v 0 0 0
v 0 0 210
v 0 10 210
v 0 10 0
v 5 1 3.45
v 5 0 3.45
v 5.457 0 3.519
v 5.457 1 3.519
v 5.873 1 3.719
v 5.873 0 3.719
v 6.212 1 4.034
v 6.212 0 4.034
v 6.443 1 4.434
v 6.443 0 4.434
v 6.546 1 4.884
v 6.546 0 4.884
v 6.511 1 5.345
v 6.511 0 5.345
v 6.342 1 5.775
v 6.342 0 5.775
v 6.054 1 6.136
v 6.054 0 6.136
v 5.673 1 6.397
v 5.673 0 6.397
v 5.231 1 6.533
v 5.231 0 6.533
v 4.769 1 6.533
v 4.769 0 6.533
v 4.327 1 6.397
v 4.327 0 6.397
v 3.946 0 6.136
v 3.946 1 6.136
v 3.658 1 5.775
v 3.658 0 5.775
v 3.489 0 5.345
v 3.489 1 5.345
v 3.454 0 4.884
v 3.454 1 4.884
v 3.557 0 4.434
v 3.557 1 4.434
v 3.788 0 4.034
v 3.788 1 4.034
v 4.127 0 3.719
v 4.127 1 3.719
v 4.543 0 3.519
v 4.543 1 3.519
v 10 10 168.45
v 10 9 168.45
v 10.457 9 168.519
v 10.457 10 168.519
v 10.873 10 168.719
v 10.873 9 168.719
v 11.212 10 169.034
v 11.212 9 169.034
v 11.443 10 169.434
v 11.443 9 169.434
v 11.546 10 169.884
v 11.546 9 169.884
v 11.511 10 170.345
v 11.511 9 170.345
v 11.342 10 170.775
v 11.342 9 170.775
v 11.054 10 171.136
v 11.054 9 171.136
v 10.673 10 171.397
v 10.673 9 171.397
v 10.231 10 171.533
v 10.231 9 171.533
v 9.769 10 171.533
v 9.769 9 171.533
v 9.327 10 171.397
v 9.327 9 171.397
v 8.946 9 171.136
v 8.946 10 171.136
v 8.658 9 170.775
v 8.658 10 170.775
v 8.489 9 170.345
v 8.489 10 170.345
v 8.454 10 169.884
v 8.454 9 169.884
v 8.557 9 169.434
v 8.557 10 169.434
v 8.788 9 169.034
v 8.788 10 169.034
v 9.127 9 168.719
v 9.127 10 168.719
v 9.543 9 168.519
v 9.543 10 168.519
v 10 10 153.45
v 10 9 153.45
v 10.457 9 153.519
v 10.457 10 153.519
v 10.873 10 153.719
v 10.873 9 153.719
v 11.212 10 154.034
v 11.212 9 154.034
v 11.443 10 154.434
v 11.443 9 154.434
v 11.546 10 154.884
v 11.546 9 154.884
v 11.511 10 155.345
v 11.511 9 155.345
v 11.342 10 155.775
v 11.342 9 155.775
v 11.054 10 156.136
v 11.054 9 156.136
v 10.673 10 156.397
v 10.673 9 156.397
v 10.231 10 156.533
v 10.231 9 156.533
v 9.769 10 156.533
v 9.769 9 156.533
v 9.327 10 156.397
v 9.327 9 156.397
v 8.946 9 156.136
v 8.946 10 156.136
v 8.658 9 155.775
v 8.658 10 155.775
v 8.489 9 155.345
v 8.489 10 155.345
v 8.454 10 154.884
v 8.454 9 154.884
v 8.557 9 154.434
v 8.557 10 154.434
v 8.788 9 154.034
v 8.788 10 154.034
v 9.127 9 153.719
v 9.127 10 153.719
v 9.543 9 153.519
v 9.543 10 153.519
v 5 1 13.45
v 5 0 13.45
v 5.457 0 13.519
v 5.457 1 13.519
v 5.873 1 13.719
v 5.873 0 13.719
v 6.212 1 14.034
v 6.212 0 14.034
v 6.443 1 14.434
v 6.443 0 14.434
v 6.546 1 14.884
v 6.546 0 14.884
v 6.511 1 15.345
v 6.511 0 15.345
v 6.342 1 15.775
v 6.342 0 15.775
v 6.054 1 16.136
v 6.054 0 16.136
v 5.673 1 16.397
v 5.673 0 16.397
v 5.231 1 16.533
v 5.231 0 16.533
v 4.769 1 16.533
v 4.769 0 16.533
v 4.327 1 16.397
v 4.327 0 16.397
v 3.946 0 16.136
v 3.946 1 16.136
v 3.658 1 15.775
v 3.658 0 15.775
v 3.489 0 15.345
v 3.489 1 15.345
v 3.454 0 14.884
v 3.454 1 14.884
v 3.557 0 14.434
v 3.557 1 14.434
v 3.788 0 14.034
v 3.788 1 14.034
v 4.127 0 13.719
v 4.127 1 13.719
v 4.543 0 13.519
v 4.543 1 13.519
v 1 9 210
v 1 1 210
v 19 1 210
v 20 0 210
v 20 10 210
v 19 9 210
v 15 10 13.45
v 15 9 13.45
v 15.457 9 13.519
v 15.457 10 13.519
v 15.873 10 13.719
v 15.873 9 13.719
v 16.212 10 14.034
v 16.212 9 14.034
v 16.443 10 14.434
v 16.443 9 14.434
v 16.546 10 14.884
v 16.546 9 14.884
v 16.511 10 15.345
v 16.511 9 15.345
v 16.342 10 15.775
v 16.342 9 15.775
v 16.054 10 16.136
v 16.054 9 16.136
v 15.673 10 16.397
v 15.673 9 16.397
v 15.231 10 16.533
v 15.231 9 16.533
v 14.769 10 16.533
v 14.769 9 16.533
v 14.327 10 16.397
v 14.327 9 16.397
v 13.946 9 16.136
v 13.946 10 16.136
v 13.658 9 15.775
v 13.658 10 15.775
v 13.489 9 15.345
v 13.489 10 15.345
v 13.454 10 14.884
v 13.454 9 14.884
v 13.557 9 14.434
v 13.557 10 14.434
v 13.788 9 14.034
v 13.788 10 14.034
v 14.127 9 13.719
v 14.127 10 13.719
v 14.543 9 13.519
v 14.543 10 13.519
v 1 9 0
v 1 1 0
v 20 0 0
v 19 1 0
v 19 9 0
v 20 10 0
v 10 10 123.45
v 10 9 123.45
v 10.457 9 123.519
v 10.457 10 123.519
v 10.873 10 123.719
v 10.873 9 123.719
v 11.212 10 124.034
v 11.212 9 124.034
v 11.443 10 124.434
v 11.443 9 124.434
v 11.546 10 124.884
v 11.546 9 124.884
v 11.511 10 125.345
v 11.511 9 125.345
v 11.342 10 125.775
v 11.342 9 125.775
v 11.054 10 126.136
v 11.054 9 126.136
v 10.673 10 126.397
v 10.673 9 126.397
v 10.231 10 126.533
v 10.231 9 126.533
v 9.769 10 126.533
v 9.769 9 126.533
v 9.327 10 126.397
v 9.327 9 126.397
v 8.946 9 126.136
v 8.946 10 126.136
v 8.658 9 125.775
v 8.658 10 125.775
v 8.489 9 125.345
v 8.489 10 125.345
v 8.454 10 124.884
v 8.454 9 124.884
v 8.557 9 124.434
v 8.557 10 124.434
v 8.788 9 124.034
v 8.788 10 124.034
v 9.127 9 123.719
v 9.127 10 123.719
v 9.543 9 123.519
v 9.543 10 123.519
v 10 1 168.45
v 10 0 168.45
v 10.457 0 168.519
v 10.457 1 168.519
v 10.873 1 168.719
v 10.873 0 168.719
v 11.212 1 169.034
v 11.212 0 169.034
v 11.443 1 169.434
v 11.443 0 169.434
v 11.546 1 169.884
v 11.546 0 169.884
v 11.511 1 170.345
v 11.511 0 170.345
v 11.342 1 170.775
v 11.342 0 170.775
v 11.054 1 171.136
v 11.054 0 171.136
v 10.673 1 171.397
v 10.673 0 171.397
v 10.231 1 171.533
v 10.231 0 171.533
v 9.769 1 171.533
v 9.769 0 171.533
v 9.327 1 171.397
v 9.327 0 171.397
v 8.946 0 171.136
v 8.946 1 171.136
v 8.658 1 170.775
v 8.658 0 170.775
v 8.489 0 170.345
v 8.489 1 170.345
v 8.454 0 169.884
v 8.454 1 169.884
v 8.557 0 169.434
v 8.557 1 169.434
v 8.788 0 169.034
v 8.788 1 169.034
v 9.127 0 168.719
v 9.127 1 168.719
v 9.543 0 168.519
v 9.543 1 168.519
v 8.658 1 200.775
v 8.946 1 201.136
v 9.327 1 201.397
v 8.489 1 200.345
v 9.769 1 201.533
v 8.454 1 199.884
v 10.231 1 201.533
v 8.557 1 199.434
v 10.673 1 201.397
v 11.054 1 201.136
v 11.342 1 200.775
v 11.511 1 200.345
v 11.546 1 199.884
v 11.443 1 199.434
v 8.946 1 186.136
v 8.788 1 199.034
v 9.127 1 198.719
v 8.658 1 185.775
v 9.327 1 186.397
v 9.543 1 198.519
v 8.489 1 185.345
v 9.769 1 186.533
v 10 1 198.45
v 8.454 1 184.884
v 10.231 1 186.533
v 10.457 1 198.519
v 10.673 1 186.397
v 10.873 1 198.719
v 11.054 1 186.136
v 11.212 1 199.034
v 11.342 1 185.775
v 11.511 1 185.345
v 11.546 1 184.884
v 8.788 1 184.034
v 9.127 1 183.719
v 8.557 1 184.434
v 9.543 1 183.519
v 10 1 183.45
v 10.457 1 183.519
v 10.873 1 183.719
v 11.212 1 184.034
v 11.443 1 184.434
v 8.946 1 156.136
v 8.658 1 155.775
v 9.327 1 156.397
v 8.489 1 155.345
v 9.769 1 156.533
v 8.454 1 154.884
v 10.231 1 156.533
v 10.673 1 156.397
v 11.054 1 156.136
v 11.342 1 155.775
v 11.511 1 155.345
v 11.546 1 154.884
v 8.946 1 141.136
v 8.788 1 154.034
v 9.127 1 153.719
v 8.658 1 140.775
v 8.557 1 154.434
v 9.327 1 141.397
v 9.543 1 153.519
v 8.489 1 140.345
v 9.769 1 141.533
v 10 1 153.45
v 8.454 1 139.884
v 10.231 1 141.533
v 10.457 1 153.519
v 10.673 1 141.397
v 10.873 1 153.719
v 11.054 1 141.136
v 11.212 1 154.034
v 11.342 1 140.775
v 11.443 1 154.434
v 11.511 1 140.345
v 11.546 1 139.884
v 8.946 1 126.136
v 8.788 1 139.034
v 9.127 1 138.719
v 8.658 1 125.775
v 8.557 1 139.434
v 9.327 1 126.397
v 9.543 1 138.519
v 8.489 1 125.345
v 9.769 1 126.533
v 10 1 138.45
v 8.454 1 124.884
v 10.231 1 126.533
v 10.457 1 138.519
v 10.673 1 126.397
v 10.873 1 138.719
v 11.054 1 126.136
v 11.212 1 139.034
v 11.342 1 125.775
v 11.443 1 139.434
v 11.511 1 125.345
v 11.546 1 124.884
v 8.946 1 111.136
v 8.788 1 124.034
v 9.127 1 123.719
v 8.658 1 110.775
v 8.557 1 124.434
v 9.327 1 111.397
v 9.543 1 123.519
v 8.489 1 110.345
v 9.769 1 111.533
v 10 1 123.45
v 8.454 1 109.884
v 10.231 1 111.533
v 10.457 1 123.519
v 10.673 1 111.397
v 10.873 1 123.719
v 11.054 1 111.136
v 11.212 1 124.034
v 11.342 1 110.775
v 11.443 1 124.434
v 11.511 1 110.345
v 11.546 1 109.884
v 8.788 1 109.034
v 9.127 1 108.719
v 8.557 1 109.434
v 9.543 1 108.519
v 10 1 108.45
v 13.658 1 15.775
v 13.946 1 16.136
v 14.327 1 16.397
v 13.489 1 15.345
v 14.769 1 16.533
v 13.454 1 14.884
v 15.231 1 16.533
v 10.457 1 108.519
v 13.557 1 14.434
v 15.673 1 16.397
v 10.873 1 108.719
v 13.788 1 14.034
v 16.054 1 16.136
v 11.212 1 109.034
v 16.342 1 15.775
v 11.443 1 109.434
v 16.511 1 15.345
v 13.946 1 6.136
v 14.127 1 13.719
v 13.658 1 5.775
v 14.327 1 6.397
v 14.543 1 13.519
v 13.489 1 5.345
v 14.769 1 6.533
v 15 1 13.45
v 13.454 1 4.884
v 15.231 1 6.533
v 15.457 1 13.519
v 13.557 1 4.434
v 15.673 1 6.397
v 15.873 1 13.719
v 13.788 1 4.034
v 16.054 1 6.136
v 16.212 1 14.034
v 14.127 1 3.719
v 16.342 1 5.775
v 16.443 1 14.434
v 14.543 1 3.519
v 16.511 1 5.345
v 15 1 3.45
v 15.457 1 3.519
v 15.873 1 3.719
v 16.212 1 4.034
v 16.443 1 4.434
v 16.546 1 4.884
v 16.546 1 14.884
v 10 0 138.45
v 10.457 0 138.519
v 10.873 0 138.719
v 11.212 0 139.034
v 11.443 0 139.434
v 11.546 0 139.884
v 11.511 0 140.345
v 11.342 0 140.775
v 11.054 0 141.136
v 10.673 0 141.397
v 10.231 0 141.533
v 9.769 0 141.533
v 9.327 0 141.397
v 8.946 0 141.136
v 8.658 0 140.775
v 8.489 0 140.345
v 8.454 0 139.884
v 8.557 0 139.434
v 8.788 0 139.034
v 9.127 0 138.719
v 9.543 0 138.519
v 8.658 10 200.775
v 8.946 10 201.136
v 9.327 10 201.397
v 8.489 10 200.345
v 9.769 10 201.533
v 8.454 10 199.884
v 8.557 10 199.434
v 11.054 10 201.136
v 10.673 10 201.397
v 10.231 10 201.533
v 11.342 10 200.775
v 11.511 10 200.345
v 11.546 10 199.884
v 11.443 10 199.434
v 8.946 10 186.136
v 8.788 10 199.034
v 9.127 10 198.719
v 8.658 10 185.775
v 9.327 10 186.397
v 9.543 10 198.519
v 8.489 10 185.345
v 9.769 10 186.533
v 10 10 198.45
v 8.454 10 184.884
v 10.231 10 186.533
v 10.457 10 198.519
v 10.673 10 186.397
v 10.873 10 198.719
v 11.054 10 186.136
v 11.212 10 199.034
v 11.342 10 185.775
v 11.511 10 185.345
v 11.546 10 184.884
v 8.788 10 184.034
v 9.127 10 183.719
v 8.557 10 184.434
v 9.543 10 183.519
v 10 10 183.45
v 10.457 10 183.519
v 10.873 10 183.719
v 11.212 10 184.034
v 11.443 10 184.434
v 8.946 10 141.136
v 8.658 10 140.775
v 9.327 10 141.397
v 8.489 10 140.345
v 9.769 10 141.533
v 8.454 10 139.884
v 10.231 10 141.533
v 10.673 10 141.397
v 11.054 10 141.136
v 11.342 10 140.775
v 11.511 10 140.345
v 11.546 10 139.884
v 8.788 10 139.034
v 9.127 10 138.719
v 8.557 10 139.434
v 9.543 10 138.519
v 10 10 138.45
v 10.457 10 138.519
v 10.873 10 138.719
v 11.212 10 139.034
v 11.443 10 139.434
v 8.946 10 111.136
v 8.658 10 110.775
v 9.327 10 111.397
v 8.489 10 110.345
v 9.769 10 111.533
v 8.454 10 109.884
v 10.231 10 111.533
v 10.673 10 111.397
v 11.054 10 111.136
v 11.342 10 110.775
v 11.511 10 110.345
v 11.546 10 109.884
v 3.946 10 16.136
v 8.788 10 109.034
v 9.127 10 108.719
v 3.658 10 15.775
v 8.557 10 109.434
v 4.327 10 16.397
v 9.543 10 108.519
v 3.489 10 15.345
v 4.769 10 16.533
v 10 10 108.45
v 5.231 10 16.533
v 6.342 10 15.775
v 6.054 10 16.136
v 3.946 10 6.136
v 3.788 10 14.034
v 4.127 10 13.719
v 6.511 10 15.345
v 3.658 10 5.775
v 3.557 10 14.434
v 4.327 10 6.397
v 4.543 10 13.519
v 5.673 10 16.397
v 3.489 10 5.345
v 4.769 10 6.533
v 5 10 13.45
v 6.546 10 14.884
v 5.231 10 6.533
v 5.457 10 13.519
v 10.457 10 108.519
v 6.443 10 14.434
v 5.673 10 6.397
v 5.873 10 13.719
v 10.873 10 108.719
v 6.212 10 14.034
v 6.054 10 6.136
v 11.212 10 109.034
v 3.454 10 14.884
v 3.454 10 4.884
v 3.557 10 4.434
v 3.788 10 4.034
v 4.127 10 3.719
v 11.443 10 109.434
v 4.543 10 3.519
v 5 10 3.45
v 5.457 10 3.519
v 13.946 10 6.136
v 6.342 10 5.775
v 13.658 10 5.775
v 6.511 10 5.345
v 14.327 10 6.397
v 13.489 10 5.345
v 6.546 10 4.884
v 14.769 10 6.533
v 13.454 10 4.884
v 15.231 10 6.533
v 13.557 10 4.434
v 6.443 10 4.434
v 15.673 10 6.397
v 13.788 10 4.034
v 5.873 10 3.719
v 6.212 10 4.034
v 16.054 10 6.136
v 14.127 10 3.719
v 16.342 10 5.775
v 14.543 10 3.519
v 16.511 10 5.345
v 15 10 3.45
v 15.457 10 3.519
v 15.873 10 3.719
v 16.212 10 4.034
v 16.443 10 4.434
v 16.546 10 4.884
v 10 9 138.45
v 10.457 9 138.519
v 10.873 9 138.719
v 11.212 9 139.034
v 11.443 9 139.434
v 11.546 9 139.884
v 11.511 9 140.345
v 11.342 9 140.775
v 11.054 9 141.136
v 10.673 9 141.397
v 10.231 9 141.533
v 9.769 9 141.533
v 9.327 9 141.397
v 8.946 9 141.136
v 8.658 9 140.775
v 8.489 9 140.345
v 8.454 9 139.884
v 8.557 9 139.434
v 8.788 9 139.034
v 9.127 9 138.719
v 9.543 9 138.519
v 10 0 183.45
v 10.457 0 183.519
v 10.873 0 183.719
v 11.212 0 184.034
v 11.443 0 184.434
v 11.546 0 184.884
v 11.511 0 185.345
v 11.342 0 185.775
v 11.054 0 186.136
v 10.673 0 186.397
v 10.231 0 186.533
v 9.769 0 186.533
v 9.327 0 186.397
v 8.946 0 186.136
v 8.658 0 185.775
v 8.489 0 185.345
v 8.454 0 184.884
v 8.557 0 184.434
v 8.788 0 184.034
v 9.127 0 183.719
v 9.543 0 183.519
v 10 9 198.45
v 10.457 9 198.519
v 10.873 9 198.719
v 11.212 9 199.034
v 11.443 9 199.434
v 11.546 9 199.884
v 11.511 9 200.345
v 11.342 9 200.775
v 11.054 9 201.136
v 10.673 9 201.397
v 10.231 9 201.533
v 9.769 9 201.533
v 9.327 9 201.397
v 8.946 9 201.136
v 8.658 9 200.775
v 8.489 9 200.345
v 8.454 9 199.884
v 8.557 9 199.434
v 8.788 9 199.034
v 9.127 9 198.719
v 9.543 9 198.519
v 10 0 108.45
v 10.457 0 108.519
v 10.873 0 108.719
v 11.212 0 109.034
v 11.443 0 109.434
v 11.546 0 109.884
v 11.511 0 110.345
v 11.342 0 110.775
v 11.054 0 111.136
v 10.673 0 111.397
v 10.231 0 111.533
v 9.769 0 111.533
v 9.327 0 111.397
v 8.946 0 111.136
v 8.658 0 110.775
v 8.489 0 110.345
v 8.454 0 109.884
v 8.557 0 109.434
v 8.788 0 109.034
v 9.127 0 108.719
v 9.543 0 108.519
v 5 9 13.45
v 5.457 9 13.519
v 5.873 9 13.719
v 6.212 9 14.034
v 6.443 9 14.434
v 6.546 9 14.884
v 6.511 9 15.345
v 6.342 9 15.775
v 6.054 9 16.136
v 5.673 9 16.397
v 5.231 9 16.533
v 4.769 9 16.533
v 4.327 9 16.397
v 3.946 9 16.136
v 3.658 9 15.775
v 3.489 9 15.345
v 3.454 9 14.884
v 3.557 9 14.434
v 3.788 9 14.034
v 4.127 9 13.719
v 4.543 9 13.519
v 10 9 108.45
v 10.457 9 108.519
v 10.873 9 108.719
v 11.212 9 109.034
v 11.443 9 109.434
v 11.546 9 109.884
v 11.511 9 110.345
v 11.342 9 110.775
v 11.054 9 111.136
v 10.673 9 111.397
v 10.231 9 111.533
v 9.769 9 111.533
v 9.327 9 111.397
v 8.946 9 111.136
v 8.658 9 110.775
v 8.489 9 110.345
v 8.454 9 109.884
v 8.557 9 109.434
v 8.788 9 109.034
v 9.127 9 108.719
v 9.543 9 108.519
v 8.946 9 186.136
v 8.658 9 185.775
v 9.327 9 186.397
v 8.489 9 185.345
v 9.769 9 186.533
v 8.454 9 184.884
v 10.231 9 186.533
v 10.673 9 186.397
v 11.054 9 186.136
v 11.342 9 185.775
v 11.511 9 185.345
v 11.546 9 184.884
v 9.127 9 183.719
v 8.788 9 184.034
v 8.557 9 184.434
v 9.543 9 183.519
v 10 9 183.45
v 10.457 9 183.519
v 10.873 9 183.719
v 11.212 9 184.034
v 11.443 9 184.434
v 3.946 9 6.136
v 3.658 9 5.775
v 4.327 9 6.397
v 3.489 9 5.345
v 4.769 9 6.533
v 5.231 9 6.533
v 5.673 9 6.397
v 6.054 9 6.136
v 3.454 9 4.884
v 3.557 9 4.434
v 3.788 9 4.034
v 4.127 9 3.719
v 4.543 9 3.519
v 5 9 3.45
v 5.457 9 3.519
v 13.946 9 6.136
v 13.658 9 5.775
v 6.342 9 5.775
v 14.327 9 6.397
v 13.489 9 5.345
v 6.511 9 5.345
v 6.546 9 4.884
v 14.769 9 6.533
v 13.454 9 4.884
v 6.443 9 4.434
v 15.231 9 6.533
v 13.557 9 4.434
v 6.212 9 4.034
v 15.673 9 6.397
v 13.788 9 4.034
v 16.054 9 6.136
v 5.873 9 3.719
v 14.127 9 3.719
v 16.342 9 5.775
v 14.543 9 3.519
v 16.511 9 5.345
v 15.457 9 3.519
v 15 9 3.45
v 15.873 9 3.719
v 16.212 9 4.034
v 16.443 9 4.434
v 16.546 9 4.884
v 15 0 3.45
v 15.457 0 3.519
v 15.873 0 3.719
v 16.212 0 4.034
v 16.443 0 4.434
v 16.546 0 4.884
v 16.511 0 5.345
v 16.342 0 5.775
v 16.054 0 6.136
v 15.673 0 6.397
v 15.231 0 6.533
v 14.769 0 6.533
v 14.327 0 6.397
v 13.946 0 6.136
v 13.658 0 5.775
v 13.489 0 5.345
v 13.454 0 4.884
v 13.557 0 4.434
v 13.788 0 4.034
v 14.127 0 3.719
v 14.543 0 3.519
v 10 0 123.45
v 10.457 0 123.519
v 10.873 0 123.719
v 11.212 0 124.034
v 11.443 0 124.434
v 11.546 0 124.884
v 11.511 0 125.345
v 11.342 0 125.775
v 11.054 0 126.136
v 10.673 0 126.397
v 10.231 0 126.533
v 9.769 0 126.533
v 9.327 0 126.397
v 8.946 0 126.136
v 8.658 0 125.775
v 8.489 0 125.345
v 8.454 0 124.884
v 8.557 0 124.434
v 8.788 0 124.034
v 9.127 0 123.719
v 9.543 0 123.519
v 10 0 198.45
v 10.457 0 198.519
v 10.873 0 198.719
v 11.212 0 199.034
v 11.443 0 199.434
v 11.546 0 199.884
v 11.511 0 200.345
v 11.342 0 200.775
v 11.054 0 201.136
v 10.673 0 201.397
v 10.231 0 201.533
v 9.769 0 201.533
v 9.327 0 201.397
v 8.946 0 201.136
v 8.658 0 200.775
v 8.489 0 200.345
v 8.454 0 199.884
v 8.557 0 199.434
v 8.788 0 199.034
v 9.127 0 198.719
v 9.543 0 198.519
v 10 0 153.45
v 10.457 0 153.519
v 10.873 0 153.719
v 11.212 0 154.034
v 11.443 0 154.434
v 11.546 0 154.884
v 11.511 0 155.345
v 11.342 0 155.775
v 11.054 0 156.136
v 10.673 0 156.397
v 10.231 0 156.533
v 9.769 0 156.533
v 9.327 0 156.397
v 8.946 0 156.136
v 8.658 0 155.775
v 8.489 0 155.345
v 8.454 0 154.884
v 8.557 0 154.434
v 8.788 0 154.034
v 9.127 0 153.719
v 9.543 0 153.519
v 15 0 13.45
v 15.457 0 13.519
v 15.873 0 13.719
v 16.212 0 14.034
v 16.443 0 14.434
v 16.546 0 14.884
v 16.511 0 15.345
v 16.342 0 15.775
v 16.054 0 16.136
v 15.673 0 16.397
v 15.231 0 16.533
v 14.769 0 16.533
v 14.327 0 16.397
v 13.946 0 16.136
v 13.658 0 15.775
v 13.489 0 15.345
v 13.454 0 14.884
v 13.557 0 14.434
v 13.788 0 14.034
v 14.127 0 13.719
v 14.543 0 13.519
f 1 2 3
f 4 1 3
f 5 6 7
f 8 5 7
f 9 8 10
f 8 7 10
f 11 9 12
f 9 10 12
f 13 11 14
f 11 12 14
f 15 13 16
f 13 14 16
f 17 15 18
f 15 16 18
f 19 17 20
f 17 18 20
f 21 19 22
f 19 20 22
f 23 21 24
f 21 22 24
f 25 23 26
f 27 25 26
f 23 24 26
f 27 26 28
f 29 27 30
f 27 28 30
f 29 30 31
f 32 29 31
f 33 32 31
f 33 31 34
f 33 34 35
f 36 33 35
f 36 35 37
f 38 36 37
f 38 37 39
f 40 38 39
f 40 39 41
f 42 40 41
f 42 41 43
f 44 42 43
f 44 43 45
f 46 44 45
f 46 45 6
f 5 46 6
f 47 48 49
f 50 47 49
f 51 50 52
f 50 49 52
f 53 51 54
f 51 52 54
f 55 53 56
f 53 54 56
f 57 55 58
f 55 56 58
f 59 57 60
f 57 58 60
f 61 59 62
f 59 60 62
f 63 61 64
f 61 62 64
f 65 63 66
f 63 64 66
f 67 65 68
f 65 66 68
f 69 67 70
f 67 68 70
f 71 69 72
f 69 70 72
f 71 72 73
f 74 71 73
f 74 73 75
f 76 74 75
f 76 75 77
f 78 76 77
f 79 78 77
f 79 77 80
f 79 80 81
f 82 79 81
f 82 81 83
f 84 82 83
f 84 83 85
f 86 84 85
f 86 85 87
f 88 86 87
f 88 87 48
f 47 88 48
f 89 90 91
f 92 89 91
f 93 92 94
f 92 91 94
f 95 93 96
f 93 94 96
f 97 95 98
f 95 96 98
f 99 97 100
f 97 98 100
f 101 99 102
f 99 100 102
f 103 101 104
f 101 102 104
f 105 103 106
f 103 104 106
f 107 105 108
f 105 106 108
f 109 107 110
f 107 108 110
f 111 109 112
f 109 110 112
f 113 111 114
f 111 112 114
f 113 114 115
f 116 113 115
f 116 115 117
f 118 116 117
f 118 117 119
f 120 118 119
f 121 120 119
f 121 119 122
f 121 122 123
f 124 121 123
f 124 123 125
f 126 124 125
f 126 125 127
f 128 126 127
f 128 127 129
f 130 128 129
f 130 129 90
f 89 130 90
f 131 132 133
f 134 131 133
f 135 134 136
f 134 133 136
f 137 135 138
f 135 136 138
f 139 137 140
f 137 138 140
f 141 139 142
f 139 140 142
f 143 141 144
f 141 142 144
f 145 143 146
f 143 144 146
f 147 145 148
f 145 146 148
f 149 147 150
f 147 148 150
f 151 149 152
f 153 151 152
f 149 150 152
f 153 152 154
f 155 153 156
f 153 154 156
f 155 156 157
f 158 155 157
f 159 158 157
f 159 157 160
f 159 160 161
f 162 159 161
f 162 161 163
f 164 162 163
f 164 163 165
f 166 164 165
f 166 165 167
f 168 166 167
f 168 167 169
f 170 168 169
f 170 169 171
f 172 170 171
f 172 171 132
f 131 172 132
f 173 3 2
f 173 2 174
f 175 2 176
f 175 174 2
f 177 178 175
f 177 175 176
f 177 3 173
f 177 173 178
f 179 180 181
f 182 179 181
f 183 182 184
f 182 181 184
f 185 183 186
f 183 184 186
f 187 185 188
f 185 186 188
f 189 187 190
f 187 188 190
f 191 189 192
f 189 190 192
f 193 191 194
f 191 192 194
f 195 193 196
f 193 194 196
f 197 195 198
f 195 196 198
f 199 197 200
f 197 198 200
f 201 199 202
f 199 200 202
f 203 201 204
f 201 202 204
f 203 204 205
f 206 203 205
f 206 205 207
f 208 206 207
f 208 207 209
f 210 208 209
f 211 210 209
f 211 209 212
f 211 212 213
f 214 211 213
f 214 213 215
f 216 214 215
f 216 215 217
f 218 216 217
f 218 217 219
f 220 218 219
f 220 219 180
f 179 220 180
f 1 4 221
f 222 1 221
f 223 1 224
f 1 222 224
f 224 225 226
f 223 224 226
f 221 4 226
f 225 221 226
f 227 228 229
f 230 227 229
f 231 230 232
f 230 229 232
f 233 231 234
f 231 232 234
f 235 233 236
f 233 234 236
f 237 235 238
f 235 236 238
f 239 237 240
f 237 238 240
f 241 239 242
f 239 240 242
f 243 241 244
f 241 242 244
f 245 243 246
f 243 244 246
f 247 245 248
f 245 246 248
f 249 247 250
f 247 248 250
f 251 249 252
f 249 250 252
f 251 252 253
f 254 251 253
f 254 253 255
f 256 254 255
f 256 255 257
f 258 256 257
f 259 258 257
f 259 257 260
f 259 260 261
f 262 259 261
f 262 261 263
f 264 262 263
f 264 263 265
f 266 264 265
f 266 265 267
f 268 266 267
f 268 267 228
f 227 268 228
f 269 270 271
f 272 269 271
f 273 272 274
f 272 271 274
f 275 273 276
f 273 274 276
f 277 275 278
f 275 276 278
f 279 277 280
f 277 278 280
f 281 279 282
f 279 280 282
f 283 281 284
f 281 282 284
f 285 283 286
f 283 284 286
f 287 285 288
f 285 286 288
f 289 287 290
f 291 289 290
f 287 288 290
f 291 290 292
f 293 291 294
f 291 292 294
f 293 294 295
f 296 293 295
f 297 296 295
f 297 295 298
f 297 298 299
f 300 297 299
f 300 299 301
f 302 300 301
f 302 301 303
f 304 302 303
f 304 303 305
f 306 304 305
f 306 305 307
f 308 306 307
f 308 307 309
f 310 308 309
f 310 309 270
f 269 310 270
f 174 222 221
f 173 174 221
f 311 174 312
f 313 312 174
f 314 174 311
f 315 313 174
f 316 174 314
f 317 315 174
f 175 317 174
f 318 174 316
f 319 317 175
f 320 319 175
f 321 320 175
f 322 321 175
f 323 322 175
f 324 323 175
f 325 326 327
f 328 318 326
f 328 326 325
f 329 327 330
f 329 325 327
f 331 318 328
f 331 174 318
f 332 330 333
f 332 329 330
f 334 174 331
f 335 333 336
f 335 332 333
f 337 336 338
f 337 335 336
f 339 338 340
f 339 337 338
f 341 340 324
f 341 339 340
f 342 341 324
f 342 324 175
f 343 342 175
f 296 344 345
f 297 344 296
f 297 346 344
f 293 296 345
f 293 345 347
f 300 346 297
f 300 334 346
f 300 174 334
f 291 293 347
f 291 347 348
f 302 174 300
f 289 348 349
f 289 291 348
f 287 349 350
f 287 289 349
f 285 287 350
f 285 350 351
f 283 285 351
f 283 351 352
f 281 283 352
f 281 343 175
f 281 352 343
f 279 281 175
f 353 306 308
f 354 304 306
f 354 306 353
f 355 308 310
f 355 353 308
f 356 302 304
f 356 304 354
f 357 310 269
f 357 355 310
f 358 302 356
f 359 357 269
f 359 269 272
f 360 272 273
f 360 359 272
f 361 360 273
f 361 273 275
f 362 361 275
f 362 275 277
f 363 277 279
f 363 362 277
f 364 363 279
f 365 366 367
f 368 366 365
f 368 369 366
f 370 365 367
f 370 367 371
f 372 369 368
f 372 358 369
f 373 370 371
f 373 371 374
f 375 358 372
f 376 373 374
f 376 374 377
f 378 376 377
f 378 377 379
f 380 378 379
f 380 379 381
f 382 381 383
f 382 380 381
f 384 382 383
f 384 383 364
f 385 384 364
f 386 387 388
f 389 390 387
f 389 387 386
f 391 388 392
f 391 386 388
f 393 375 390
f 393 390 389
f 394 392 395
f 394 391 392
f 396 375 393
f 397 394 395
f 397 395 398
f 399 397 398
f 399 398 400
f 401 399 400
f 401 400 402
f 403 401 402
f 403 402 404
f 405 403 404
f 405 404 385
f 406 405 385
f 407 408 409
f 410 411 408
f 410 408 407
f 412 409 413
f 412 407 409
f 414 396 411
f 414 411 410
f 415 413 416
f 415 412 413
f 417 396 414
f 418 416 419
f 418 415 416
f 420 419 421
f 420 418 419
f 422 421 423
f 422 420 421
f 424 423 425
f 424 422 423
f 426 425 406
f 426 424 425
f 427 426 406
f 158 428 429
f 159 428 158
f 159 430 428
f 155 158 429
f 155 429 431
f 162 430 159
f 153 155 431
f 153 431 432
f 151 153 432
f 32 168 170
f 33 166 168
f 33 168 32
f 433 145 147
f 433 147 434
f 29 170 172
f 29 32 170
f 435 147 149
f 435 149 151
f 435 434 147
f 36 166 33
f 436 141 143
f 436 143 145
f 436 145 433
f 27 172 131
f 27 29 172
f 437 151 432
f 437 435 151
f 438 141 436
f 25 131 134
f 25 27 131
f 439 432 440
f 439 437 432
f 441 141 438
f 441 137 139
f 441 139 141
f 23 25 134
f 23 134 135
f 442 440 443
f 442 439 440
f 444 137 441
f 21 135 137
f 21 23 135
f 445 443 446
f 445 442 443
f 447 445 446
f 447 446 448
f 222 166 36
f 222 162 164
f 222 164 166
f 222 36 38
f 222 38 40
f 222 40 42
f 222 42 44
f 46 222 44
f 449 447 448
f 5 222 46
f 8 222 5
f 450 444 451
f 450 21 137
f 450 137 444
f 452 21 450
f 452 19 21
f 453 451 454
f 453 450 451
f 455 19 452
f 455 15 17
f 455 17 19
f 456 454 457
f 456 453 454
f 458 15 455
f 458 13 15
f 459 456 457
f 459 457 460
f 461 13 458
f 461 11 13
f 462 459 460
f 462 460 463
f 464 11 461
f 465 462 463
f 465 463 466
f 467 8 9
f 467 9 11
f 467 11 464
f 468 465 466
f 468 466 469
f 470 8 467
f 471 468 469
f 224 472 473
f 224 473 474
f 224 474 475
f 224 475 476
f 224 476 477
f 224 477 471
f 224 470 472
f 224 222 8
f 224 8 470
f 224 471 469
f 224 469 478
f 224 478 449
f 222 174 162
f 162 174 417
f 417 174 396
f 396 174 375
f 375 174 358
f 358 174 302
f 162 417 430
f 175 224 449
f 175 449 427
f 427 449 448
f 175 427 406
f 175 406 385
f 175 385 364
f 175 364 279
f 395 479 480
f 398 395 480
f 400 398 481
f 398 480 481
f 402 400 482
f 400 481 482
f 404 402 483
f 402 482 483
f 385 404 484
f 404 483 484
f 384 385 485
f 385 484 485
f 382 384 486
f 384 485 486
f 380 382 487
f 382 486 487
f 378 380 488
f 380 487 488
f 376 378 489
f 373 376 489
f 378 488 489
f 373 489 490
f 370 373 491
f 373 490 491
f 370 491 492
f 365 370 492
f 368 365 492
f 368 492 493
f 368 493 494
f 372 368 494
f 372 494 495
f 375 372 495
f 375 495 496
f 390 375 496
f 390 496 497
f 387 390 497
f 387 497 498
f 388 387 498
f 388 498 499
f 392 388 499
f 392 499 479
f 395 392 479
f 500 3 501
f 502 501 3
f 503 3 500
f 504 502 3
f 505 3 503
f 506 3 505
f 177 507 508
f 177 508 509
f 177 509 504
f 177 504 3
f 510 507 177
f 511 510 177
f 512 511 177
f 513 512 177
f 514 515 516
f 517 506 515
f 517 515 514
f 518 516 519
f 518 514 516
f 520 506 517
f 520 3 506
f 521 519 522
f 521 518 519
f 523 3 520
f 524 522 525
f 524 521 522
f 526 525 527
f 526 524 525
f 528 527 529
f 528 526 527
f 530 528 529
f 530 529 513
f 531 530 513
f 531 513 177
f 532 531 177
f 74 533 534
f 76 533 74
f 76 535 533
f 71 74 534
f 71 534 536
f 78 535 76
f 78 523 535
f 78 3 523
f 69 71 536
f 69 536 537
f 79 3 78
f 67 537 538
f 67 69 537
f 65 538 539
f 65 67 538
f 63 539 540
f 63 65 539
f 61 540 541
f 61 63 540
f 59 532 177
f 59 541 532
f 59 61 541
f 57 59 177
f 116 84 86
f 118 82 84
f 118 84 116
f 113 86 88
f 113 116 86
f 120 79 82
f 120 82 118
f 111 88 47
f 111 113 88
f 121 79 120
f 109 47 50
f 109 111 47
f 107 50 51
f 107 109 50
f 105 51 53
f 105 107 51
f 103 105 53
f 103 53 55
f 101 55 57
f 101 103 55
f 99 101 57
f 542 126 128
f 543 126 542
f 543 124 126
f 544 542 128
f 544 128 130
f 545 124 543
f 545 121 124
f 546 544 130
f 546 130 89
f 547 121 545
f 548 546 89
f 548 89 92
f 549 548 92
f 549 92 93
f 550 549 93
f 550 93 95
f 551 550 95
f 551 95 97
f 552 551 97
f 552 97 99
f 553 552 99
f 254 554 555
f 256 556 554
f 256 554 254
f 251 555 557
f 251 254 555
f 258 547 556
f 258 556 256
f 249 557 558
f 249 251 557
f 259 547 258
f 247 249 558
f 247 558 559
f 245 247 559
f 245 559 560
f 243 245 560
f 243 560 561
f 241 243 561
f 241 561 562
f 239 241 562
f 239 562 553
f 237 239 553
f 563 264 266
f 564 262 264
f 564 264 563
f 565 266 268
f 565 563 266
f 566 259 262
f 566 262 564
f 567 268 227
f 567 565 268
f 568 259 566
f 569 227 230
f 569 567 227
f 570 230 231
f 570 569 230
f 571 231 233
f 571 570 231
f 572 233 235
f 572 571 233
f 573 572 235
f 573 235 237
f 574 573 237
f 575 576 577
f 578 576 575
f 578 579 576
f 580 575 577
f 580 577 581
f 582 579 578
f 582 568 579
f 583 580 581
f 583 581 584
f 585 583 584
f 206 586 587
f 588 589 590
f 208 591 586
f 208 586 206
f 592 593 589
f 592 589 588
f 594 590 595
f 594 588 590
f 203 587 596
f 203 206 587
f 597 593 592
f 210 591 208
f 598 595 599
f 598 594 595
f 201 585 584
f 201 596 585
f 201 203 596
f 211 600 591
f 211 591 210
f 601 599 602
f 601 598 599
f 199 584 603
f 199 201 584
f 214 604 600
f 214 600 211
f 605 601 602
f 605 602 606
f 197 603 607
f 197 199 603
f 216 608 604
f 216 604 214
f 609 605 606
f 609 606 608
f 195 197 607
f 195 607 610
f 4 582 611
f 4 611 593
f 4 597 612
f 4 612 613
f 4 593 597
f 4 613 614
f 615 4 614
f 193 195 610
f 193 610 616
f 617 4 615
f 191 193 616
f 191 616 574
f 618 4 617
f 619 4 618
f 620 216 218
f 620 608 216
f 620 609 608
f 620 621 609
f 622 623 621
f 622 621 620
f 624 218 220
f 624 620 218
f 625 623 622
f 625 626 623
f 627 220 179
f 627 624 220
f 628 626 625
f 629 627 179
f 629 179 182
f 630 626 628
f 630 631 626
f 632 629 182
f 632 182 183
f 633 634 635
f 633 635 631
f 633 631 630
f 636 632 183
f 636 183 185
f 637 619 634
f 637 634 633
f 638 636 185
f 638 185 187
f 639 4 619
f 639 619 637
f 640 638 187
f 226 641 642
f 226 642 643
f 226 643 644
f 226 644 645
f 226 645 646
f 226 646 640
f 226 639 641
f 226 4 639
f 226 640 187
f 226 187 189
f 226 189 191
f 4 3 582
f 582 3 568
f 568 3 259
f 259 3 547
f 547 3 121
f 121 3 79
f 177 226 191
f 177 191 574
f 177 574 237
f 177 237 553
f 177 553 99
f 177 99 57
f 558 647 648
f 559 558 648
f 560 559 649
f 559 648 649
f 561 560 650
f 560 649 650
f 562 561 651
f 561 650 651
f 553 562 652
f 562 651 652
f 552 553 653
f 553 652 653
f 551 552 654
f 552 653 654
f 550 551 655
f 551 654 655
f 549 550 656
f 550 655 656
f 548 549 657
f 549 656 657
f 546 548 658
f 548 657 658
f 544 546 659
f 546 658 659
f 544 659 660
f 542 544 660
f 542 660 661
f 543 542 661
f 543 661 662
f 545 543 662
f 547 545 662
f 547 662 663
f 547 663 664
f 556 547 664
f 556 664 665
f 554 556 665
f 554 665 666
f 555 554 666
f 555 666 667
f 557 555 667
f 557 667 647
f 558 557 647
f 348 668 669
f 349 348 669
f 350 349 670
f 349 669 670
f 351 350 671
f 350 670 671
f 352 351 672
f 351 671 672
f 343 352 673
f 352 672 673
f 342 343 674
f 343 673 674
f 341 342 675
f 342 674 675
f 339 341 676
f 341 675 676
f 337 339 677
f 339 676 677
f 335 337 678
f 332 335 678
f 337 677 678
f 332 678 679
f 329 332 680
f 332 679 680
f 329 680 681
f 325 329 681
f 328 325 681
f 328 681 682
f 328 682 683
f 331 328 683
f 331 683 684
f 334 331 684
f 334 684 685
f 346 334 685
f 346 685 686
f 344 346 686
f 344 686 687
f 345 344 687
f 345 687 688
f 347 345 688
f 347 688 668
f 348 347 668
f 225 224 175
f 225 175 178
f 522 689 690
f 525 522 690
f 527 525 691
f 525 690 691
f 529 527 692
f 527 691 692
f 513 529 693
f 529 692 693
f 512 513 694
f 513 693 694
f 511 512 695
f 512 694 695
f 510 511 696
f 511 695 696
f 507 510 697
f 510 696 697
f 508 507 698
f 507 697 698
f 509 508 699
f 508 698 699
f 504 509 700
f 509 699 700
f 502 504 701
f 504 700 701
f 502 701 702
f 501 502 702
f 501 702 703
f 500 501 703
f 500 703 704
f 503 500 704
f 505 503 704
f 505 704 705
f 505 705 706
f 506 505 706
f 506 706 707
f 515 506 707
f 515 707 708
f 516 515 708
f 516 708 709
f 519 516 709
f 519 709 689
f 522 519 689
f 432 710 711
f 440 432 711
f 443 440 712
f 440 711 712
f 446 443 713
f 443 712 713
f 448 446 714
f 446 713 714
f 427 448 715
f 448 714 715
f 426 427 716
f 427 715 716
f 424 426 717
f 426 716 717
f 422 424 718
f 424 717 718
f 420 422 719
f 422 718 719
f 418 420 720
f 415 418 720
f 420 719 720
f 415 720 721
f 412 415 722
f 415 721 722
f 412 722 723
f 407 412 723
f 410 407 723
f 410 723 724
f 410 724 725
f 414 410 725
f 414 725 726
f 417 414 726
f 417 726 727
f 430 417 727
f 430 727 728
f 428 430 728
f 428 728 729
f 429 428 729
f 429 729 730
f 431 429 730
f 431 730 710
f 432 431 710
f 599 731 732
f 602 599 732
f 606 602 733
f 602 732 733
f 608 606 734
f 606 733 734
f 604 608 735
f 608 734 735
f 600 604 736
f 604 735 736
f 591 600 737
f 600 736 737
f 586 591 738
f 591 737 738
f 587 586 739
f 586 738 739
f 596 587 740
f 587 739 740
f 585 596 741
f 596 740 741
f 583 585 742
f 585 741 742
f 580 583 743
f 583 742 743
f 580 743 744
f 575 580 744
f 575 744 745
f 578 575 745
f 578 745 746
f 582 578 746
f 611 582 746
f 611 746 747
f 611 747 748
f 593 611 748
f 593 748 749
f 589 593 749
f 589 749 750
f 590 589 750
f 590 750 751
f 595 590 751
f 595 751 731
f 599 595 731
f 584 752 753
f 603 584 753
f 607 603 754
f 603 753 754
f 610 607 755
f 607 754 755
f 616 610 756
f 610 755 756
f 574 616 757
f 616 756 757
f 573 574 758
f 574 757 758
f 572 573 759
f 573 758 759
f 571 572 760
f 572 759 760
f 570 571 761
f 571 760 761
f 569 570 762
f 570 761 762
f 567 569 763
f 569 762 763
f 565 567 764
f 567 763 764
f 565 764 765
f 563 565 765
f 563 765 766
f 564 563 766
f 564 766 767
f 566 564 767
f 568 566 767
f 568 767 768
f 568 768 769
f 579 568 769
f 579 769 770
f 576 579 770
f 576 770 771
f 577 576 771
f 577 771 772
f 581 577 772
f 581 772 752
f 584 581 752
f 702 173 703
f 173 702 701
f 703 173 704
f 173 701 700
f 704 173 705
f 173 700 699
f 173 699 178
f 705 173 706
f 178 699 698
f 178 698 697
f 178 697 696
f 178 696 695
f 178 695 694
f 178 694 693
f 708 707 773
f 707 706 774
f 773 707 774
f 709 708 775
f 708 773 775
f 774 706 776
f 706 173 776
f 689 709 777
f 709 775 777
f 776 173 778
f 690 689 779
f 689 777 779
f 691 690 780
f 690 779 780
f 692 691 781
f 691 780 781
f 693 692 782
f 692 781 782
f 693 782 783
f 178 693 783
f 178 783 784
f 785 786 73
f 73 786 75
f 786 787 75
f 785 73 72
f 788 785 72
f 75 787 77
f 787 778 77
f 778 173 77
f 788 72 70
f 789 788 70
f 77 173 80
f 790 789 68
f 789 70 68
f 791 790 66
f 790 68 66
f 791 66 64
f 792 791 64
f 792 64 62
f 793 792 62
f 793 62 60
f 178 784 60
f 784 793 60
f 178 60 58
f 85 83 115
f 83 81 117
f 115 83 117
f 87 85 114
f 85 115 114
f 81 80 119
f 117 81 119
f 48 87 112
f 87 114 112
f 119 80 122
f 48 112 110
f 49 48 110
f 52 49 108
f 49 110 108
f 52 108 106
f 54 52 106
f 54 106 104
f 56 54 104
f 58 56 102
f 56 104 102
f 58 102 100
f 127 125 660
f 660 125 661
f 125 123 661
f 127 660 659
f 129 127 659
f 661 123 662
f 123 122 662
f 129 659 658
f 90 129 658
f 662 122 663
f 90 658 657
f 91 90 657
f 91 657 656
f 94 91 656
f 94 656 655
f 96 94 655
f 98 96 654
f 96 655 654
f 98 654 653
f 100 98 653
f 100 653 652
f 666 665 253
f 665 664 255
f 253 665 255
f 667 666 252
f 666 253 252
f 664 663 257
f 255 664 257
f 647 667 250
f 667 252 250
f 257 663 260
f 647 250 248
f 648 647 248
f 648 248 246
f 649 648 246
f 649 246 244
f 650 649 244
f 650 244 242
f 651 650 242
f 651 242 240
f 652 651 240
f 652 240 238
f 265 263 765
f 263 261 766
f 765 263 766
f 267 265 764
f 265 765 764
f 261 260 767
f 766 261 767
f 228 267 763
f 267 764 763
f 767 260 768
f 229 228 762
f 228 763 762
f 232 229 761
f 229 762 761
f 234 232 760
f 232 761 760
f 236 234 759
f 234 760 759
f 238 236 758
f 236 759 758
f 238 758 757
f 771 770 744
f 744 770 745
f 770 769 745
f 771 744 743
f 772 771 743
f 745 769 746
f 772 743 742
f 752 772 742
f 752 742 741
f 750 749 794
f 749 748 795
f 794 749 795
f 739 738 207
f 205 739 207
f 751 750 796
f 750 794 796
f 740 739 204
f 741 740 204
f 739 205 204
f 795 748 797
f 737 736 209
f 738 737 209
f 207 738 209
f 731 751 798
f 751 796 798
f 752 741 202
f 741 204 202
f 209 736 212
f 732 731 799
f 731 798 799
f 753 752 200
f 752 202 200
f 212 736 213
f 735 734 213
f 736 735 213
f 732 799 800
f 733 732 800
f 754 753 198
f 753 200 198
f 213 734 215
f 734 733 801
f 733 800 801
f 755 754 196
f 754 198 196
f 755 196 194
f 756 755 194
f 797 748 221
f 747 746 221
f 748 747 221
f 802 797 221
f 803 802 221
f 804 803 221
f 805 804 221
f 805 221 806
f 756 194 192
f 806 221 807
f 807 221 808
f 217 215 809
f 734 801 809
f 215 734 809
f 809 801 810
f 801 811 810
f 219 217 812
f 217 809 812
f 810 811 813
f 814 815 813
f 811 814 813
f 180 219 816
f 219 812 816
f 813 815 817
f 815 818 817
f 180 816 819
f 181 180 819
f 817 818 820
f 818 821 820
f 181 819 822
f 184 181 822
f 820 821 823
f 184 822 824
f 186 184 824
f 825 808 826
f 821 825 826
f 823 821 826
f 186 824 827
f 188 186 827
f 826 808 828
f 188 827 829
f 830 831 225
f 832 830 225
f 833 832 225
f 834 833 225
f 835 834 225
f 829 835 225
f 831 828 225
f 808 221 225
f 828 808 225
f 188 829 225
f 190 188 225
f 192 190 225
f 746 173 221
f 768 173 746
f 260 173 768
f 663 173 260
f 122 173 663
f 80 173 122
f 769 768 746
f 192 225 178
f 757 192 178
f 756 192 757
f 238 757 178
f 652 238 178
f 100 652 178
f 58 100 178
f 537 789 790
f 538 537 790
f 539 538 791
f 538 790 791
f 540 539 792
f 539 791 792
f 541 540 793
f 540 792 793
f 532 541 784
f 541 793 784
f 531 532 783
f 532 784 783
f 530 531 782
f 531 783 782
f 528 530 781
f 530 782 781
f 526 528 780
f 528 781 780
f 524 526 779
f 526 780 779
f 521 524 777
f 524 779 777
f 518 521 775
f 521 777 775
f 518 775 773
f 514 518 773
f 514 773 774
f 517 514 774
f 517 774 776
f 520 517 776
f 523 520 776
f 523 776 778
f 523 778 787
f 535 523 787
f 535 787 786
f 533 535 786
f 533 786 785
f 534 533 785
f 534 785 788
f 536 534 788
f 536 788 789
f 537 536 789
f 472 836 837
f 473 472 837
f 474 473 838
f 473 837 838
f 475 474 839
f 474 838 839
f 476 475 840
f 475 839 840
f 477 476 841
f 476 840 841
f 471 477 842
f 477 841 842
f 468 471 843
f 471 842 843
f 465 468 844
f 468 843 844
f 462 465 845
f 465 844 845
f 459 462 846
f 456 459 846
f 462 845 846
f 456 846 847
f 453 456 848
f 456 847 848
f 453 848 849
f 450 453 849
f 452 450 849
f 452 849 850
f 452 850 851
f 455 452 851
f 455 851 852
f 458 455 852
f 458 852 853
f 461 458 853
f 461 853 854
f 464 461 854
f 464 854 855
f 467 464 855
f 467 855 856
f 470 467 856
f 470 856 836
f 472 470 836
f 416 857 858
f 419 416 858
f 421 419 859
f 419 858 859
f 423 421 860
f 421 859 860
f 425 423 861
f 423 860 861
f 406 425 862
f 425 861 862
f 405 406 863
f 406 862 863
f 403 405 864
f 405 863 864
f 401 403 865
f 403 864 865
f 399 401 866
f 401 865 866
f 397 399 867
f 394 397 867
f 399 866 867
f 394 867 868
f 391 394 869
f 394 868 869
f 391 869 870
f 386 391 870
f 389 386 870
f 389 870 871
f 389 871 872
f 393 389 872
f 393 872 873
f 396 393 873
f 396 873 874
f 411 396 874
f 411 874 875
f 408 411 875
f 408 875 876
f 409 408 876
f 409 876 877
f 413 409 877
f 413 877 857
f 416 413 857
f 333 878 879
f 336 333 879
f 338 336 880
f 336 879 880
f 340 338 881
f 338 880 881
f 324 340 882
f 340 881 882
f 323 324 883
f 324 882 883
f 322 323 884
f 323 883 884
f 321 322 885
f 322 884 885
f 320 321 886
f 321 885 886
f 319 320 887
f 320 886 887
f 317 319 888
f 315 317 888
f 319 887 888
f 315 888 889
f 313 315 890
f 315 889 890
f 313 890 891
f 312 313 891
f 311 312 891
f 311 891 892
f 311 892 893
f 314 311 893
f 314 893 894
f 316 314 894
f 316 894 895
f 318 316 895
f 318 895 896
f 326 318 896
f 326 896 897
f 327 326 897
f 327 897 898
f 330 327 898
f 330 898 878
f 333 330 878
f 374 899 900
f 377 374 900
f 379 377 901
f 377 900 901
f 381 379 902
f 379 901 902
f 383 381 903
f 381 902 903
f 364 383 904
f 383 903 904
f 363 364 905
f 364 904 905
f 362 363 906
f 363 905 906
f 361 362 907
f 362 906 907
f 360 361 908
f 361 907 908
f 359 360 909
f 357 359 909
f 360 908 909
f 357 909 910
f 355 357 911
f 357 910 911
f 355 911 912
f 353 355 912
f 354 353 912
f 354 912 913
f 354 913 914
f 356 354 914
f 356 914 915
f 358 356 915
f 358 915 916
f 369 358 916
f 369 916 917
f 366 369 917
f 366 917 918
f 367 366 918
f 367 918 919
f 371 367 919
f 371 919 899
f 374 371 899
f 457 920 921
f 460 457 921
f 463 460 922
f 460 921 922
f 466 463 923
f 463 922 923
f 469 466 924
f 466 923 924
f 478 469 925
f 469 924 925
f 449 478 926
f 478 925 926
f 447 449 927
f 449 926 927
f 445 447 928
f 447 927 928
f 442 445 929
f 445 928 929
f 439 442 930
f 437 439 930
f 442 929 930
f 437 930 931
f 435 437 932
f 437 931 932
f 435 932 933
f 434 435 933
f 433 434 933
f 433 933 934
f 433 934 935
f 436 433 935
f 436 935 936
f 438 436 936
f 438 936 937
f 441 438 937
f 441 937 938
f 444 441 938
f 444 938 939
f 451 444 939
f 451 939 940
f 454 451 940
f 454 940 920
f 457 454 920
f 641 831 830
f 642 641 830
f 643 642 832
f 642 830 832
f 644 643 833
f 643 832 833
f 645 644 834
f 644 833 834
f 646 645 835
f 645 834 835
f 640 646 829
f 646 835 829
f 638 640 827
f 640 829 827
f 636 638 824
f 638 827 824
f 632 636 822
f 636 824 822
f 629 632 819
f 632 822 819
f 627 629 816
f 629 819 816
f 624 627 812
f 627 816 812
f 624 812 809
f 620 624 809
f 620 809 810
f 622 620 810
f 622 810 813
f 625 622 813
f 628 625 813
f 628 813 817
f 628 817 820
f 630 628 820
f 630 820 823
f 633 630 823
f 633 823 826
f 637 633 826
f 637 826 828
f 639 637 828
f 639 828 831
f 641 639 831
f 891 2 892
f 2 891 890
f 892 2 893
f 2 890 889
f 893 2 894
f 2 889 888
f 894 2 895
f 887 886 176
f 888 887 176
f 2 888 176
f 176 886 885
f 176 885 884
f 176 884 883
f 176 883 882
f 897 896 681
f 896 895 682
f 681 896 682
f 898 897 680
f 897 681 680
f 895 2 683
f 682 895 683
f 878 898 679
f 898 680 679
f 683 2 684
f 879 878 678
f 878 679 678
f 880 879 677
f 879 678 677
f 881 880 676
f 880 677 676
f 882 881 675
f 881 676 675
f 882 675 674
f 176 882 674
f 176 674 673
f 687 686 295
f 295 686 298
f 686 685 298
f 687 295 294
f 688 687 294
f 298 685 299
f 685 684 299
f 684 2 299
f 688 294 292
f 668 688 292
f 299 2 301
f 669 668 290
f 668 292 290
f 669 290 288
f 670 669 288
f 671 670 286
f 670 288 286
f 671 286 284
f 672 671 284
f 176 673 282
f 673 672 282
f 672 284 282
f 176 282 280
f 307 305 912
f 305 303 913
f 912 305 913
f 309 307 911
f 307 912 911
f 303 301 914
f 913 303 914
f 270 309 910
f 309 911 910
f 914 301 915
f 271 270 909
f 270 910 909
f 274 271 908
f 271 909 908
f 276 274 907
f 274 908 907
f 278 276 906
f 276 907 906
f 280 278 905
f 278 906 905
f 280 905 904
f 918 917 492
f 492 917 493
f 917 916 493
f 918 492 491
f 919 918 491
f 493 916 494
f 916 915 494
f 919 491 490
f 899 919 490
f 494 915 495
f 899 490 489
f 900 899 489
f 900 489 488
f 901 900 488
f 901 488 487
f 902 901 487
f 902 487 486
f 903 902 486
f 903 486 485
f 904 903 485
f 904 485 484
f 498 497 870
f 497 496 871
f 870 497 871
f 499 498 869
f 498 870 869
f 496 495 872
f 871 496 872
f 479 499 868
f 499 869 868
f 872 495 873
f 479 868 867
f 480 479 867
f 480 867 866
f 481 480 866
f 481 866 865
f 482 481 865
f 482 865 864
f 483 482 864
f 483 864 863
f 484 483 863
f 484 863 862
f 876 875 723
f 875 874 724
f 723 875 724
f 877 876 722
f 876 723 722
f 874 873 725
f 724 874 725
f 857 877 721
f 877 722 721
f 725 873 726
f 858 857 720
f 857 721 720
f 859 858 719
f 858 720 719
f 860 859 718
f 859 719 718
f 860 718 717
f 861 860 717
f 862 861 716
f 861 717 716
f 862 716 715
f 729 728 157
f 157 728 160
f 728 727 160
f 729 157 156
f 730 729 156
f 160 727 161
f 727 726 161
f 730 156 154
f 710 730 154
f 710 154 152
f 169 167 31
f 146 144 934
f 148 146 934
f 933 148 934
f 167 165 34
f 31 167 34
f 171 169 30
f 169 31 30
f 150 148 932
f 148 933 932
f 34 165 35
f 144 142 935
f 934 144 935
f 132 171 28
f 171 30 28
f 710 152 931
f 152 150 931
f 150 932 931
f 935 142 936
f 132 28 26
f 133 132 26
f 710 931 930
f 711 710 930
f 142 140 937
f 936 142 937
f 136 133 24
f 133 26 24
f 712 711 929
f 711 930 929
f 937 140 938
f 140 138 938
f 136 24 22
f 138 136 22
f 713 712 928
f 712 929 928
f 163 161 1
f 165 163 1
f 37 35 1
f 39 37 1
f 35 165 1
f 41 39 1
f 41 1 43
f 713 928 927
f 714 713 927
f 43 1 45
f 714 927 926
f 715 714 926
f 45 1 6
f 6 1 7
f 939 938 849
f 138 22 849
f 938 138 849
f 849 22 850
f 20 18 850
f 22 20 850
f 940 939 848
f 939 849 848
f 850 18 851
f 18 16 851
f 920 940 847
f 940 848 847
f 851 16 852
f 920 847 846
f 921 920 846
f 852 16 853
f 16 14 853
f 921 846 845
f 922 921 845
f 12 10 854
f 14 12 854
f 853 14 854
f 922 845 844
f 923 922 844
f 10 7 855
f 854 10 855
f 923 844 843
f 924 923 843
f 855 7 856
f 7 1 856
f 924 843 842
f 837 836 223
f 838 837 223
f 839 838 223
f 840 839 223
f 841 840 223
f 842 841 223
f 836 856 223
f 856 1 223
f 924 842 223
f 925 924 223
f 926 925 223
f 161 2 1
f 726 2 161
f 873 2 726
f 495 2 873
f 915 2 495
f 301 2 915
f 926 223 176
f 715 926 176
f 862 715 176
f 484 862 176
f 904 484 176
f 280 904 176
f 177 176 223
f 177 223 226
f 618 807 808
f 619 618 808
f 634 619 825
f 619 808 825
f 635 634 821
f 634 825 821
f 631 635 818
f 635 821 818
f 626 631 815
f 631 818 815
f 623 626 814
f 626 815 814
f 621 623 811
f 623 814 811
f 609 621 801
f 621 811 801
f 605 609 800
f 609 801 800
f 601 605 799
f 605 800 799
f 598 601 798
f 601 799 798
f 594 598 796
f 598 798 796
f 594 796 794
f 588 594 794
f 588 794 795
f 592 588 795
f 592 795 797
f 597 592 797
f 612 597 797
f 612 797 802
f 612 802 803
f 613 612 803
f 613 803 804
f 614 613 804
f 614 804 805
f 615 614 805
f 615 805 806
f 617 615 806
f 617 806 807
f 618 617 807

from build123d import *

# Parameters (mm, degrees)
SKETCH_1_W          = 20
SKETCH_1_H          = 10
SKETCH_1_W_2        = 18
SKETCH_1_H_2        = 8
EXTRUDE_1_DEPTH     = 210
SKETCH_2_R          = 1.55
CUT_EXTRUDE_1_DEPTH = 212.187120819
SKETCH_3_R          = 1.55
CUT_EXTRUDE_2_DEPTH = 212.187120819


with BuildPart() as part:
    # 草图1 → 凸台-拉伸1 (new body)
    with BuildSketch(Plane.XY):
        with Locations((10, 5)):
            Rectangle(SKETCH_1_W, SKETCH_1_H)
        with Locations((10, 5)):
            Rectangle(SKETCH_1_W_2, SKETCH_1_H_2, mode=Mode.SUBTRACT)
    extrude(amount=EXTRUDE_1_DEPTH)

    # 草图2 → 切除-拉伸1 (cut, through all)
    with BuildSketch(Plane.XZ):
        with Locations(Location((5, 5, 0), (0, 0, 270))):
            Circle(SKETCH_2_R)
        with Locations(Location((15, 5, 0), (0, 0, 270))):
            Circle(SKETCH_2_R)
        with Locations(Location((15, 15, 0), (0, 0, 270))):
            Circle(SKETCH_2_R)
        with Locations(Location((5, 15, 0), (0, 0, 270))):
            Circle(SKETCH_2_R)
    extrude(amount=-CUT_EXTRUDE_1_DEPTH, mode=Mode.SUBTRACT)

    # 草图3 → 切除-拉伸2 (cut, through all)
    with BuildSketch(Plane.XZ):
        with Locations(Location((10, 200, 0), (0, 0, 270))):
            Circle(SKETCH_3_R)
        with Locations(Location((10, 185, 0), (0, 0, 270))):
            Circle(SKETCH_3_R)
        with Locations(Location((10, 170, 0), (0, 0, 270))):
            Circle(SKETCH_3_R)
        with Locations(Location((10, 155, 0), (0, 0, 270))):
            Circle(SKETCH_3_R)
        with Locations(Location((10, 140, 0), (0, 0, 270))):
            Circle(SKETCH_3_R)
        with Locations(Location((10, 125, 0), (0, 0, 270))):
            Circle(SKETCH_3_R)
        with Locations(Location((10, 110, 0), (0, 0, 270))):
            Circle(SKETCH_3_R)
    extrude(amount=-CUT_EXTRUDE_2_DEPTH, mode=Mode.SUBTRACT)


solid = part.part
